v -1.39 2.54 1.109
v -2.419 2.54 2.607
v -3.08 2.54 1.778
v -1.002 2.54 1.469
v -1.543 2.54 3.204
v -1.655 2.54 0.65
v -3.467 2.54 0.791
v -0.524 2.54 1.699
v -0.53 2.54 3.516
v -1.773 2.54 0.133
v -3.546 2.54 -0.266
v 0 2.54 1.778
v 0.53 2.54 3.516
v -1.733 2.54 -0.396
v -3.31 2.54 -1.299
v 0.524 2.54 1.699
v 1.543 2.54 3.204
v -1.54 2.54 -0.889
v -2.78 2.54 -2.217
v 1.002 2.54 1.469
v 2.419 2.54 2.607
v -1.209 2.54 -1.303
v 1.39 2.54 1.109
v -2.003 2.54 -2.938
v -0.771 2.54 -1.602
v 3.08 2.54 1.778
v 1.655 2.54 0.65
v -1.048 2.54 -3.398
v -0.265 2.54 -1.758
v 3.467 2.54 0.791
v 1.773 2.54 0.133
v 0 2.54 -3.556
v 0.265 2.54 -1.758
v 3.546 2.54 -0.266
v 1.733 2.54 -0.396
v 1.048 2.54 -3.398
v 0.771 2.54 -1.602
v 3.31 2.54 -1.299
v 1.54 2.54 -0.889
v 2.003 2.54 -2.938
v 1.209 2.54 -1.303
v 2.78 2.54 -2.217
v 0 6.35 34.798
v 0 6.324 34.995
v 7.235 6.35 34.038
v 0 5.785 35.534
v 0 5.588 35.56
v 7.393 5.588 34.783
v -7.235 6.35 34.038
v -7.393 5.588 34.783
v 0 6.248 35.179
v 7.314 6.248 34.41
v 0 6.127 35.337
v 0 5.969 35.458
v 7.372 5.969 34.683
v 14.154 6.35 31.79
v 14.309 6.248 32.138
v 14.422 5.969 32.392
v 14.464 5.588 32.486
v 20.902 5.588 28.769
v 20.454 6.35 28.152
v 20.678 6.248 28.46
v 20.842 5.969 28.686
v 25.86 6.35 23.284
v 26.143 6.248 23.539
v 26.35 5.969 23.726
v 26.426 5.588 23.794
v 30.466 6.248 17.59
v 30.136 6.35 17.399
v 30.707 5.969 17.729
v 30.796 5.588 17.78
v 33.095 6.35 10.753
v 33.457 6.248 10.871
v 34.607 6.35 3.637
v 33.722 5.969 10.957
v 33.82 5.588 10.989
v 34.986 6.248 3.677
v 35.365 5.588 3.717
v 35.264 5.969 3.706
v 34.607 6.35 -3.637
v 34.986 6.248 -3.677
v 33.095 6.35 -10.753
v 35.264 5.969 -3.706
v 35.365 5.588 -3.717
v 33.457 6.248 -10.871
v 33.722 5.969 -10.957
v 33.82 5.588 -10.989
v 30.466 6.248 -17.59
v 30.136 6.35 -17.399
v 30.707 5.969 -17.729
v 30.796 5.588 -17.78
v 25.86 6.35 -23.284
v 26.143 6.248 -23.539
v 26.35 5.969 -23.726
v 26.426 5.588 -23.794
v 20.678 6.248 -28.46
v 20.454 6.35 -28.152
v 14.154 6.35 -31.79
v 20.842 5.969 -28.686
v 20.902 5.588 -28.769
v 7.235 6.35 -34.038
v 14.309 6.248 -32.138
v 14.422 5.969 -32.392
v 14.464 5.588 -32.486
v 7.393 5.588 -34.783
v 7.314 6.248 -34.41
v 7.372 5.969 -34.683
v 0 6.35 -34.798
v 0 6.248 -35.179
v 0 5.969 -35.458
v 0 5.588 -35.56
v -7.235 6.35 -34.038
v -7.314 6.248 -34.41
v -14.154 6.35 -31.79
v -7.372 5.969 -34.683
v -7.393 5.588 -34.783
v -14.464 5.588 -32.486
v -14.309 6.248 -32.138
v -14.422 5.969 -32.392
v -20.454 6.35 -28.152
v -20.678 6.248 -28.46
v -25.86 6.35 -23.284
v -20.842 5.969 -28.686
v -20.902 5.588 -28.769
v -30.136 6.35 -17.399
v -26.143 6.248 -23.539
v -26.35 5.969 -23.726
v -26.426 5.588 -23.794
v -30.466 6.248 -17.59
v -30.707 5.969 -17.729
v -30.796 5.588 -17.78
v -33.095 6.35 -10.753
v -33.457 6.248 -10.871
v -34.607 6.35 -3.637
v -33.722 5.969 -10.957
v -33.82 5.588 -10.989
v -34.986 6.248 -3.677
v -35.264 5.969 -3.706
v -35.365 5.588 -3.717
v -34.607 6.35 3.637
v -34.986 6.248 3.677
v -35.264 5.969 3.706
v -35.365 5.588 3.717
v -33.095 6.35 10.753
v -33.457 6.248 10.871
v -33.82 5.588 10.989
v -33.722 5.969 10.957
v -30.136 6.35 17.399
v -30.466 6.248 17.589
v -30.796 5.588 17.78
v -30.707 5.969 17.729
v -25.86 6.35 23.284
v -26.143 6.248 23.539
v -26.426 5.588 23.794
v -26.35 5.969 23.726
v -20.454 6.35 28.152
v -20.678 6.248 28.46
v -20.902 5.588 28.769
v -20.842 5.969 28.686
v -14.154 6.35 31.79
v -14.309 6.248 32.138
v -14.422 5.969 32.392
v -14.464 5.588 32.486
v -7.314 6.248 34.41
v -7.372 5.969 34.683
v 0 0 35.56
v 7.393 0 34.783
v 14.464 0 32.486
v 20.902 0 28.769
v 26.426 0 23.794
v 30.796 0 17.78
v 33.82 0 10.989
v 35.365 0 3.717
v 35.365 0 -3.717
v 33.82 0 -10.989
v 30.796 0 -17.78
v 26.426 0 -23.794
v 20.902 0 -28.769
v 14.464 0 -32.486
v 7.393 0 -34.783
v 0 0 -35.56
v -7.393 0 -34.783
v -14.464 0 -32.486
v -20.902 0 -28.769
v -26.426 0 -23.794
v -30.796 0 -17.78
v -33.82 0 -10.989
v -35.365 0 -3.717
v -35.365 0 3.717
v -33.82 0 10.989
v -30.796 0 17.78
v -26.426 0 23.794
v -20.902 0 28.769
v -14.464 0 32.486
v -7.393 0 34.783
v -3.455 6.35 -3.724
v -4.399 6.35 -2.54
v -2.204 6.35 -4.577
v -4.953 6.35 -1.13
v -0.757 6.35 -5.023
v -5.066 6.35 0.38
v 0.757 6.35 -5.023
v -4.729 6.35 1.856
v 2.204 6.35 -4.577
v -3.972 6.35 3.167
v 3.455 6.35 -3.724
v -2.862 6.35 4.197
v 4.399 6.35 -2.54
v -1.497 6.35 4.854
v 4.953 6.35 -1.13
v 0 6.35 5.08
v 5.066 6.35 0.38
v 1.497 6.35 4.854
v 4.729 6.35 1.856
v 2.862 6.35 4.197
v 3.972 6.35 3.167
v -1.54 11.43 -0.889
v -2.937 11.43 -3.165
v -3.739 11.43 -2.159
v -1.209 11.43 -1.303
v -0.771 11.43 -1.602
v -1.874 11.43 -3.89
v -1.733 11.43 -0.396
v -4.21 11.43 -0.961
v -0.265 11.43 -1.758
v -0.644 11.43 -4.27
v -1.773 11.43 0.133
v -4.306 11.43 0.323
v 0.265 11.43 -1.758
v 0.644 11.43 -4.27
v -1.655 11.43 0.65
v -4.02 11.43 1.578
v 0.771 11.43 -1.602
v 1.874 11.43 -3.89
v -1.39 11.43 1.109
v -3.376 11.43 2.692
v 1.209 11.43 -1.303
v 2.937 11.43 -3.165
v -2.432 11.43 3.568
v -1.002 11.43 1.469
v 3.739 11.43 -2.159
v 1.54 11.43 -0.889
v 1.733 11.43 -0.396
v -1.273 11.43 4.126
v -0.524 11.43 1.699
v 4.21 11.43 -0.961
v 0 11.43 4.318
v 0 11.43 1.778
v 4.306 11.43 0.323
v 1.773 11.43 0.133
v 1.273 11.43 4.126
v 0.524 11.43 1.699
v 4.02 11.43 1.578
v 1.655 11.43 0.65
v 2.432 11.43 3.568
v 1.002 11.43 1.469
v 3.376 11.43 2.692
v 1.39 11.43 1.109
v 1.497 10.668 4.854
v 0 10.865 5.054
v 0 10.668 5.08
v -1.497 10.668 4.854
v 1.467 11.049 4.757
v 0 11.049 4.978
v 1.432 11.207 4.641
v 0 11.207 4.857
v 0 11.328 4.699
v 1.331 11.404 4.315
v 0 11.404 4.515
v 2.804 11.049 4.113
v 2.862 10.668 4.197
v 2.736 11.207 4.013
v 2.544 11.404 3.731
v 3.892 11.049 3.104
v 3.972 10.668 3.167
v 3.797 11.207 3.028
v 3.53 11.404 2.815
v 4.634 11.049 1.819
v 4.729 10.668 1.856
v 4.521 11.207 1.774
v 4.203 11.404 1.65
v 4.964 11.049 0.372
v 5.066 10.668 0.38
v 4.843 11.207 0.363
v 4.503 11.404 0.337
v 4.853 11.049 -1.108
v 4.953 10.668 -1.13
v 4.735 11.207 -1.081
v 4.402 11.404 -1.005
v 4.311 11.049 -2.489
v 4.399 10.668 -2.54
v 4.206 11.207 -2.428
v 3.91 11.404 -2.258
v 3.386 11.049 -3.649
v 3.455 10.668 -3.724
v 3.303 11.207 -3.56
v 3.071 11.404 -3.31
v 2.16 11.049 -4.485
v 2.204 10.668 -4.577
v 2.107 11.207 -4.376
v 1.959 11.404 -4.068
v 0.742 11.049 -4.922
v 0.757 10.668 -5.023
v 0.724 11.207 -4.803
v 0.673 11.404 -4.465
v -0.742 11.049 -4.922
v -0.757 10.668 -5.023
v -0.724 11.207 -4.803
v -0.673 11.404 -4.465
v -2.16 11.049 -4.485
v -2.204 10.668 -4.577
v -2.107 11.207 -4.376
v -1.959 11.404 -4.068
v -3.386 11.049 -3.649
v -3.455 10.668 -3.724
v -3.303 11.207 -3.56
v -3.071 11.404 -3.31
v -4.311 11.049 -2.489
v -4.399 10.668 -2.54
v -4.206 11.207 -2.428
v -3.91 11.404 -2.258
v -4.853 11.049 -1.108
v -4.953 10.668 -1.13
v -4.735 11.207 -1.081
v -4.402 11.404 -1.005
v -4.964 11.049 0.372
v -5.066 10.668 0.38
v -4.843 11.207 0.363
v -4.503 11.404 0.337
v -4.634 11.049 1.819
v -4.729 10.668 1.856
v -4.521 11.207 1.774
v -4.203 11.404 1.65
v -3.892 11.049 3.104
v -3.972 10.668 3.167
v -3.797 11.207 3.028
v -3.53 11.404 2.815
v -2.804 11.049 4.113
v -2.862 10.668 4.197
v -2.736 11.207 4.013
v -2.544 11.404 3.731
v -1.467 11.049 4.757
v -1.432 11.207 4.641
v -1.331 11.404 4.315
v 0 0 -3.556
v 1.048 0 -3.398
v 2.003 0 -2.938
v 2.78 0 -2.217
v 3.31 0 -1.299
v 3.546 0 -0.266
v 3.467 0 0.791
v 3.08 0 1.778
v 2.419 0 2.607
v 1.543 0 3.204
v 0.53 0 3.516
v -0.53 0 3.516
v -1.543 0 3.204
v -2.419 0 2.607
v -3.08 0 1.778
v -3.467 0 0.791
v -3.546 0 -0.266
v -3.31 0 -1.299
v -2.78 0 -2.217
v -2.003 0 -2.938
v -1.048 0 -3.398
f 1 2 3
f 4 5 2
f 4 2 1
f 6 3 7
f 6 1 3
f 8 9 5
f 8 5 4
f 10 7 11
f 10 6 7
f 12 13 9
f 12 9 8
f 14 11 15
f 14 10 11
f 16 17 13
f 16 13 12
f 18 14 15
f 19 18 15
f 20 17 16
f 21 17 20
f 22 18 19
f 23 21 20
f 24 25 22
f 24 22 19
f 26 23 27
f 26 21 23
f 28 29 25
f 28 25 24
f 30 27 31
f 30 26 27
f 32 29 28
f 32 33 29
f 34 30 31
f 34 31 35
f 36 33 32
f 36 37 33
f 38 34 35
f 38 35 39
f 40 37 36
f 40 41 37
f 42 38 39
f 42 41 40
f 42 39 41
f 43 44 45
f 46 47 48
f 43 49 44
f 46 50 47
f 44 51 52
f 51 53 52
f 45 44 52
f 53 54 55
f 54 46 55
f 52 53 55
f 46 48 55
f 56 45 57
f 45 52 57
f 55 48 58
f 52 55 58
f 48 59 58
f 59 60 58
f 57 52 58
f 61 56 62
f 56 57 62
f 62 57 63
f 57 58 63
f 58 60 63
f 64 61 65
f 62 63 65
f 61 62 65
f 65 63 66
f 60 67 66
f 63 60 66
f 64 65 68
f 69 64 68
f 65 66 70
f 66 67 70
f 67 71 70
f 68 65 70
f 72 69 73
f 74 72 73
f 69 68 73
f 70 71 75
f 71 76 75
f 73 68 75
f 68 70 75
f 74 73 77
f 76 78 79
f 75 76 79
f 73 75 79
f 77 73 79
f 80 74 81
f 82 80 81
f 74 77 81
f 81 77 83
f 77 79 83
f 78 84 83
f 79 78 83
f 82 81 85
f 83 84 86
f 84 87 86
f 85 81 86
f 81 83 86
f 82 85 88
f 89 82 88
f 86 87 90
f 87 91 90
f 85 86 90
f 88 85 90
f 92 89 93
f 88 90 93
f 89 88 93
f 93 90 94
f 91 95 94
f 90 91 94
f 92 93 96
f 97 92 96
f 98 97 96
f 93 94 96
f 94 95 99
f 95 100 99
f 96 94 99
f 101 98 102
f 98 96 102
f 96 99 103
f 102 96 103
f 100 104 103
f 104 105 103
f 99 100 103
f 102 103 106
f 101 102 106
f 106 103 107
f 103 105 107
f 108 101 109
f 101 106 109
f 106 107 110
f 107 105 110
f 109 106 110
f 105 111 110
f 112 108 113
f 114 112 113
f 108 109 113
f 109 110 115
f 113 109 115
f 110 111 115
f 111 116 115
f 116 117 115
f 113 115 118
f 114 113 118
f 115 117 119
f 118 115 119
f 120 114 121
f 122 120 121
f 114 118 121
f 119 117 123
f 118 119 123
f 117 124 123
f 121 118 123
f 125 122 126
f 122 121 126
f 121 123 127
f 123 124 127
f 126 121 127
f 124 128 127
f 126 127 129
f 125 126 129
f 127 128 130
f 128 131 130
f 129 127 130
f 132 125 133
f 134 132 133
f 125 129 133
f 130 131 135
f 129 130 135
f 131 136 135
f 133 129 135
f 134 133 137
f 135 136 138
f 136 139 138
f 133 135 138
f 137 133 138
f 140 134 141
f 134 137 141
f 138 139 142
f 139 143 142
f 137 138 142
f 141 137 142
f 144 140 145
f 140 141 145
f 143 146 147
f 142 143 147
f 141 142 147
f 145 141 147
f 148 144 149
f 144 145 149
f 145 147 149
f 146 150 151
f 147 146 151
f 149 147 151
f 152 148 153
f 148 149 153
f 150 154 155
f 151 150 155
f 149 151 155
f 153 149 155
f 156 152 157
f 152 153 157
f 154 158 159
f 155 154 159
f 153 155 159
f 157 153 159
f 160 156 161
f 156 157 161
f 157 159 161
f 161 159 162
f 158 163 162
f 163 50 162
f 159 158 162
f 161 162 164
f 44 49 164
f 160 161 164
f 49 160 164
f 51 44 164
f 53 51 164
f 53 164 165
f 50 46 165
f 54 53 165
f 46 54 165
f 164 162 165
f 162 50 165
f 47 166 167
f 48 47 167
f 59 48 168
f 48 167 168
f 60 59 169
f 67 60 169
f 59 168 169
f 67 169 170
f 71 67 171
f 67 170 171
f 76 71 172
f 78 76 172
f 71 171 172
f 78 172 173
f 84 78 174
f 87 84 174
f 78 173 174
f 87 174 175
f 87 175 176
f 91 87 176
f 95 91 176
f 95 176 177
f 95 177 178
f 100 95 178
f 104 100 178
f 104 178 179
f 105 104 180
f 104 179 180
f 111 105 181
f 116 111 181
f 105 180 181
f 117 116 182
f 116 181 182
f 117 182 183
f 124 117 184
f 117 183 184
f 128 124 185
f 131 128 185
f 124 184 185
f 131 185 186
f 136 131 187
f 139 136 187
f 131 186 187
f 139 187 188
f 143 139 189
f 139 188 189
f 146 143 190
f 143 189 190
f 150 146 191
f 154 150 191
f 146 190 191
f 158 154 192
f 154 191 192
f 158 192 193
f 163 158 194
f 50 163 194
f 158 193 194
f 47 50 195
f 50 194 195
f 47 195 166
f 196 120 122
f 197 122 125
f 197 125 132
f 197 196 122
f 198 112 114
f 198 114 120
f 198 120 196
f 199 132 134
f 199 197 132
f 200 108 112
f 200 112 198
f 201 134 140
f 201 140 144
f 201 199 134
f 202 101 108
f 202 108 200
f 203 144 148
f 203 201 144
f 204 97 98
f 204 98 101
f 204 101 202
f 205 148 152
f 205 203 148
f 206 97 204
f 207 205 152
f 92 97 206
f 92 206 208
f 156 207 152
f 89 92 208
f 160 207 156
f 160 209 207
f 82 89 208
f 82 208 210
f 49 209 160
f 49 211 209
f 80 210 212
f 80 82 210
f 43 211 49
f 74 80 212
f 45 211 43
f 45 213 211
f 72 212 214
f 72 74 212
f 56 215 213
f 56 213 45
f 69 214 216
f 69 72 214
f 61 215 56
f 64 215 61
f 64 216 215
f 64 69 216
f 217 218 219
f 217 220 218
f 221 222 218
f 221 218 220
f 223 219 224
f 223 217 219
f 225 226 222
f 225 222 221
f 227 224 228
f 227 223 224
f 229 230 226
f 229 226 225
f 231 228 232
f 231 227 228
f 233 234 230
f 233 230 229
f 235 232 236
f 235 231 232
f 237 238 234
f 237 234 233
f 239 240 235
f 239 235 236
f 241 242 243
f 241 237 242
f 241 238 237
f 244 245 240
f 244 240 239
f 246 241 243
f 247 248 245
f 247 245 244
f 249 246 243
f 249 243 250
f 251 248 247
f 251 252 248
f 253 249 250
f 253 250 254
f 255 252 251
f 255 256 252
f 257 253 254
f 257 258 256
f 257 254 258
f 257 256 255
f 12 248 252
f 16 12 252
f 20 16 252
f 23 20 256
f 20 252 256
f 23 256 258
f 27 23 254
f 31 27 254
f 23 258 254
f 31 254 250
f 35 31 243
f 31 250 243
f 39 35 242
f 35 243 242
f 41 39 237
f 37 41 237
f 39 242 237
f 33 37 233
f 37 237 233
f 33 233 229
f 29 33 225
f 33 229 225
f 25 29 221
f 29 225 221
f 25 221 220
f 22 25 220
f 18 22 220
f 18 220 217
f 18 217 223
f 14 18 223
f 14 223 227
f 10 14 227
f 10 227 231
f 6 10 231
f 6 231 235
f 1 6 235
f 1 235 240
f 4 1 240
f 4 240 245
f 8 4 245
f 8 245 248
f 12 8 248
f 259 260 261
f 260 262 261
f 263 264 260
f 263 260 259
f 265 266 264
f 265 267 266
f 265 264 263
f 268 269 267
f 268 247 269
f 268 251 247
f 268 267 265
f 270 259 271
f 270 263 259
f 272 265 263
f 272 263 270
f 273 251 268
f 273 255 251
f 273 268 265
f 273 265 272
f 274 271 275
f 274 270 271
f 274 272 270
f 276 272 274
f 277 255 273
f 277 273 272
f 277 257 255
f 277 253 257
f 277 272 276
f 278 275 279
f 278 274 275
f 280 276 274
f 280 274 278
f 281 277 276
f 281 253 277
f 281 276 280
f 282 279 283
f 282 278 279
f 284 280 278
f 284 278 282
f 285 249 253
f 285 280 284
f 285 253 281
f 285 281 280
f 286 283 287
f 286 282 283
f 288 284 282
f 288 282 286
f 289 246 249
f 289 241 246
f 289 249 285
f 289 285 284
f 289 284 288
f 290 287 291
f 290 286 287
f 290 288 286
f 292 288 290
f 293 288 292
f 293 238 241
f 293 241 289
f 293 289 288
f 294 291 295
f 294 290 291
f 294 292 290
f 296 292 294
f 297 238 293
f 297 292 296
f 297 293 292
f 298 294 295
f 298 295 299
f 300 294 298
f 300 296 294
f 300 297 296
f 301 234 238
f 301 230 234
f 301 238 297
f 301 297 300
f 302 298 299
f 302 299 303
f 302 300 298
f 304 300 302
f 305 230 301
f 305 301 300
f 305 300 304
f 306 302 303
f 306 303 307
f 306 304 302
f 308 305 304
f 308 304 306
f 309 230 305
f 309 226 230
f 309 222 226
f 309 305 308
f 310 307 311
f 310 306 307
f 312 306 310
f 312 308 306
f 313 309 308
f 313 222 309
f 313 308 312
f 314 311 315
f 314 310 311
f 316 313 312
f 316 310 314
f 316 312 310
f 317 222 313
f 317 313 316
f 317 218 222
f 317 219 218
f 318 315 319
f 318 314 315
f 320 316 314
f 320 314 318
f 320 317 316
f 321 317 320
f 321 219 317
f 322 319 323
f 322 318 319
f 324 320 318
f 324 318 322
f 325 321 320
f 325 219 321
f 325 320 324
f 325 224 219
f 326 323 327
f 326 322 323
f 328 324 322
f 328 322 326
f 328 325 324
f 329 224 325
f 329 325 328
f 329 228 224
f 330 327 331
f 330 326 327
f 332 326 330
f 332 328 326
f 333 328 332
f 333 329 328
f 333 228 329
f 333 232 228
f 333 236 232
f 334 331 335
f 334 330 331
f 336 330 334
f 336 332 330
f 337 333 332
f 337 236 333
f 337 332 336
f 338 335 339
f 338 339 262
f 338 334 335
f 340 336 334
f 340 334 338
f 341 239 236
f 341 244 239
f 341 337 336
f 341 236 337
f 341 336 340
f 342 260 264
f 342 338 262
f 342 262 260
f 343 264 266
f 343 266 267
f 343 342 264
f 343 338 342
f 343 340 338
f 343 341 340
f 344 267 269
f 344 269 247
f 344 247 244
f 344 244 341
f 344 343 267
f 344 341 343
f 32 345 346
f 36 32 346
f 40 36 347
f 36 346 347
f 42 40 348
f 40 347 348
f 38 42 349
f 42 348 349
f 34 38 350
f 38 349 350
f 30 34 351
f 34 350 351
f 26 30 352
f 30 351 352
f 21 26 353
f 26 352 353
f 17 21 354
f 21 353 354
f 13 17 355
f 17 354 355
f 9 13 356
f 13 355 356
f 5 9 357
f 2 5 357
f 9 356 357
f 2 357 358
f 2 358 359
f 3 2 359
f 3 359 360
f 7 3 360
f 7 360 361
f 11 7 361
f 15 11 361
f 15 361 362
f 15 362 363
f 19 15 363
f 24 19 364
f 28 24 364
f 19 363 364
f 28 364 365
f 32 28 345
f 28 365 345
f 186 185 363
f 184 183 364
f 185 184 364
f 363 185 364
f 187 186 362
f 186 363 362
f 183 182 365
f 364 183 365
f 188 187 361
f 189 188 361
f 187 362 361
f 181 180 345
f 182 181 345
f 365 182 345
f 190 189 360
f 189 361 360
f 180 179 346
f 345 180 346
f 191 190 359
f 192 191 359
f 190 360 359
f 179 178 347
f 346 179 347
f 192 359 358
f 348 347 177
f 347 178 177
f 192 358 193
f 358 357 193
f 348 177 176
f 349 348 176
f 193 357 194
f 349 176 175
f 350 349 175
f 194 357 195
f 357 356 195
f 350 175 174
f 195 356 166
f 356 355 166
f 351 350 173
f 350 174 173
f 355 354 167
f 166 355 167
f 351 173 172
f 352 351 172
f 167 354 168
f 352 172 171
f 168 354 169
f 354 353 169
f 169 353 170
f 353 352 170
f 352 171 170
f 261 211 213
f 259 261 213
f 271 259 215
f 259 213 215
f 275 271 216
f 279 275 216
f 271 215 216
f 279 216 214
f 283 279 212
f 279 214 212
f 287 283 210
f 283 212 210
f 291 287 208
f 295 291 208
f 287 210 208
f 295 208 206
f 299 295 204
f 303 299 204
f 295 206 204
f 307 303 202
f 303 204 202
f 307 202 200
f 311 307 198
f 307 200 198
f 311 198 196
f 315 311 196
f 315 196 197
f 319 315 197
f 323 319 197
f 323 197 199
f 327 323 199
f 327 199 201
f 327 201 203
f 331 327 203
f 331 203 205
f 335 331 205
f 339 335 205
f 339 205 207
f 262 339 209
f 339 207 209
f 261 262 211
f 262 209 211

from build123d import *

# Parameters (mm, degrees)
SKETCH1_R           = 35.56
BOSS_EXTRUDE1_DEPTH = 6.35
SKETCH2_R           = 5.08
BOSS_EXTRUDE2_DEPTH = 5.08
SKETCH3_R           = 1.778
CUT_EXTRUDE1_DEPTH  = 12.43
SKETCH4_R           = 3.556
CUT_EXTRUDE2_DEPTH  = 2.54
FILLET1_R           = 0.762
FILLET2_R           = 0.762


with BuildPart() as part:
    # Sketch1 → Boss-Extrude1 (new body)
    with BuildSketch(Plane(origin=(0, 0, 0), x_dir=(1, 0, 0), z_dir=(0, 1, 0))):
        with Locations(Location((0, 0, 0), (0, 0, 270))):  # turned: the seam where the file's is
            Circle(SKETCH1_R)
    extrude(amount=BOSS_EXTRUDE1_DEPTH)

    # Sketch2 → Boss-Extrude2 (add)
    with BuildSketch(Plane(origin=(0, 6.35, 0), x_dir=(1, 0, 0), z_dir=(0, 1, 0))):
        with Locations(Location((0, 0, 0), (0, 0, 270))):  # turned: the seam where the file's is
            Circle(SKETCH2_R)
    extrude(amount=BOSS_EXTRUDE2_DEPTH)

    # Sketch3 → Cut-Extrude1 (cut, through all)
    with BuildSketch(Plane(origin=(0, 11.43, 0), x_dir=(1, 0, 0), z_dir=(0, 1, 0))):
        with Locations(Location((0, 0, 0), (0, 0, 270))):  # turned: the seam where the file's is
            Circle(SKETCH3_R)
    extrude(amount=-CUT_EXTRUDE1_DEPTH, mode=Mode.SUBTRACT)

    # Sketch4 → Cut-Extrude2 (cut)
    with BuildSketch(Plane.XZ):
        with Locations(Location((0, 0, 0), (0, 0, 270))):  # turned: the seam where the file's is
            Circle(SKETCH4_R)
    extrude(amount=-CUT_EXTRUDE2_DEPTH, mode=Mode.SUBTRACT)

    # Fillet1
    fillet1_edges = [part.edges().sort_by_distance(p)[0] for p in [
        (0, 11.43, -5.08),
    ]]
    fillet(fillet1_edges, radius=FILLET1_R)

    # Fillet2
    fillet2_edges = [part.edges().sort_by_distance(p)[0] for p in [
        (0, 6.35, -35.56),
    ]]
    fillet(fillet2_edges, radius=FILLET2_R)


solid = part.part
